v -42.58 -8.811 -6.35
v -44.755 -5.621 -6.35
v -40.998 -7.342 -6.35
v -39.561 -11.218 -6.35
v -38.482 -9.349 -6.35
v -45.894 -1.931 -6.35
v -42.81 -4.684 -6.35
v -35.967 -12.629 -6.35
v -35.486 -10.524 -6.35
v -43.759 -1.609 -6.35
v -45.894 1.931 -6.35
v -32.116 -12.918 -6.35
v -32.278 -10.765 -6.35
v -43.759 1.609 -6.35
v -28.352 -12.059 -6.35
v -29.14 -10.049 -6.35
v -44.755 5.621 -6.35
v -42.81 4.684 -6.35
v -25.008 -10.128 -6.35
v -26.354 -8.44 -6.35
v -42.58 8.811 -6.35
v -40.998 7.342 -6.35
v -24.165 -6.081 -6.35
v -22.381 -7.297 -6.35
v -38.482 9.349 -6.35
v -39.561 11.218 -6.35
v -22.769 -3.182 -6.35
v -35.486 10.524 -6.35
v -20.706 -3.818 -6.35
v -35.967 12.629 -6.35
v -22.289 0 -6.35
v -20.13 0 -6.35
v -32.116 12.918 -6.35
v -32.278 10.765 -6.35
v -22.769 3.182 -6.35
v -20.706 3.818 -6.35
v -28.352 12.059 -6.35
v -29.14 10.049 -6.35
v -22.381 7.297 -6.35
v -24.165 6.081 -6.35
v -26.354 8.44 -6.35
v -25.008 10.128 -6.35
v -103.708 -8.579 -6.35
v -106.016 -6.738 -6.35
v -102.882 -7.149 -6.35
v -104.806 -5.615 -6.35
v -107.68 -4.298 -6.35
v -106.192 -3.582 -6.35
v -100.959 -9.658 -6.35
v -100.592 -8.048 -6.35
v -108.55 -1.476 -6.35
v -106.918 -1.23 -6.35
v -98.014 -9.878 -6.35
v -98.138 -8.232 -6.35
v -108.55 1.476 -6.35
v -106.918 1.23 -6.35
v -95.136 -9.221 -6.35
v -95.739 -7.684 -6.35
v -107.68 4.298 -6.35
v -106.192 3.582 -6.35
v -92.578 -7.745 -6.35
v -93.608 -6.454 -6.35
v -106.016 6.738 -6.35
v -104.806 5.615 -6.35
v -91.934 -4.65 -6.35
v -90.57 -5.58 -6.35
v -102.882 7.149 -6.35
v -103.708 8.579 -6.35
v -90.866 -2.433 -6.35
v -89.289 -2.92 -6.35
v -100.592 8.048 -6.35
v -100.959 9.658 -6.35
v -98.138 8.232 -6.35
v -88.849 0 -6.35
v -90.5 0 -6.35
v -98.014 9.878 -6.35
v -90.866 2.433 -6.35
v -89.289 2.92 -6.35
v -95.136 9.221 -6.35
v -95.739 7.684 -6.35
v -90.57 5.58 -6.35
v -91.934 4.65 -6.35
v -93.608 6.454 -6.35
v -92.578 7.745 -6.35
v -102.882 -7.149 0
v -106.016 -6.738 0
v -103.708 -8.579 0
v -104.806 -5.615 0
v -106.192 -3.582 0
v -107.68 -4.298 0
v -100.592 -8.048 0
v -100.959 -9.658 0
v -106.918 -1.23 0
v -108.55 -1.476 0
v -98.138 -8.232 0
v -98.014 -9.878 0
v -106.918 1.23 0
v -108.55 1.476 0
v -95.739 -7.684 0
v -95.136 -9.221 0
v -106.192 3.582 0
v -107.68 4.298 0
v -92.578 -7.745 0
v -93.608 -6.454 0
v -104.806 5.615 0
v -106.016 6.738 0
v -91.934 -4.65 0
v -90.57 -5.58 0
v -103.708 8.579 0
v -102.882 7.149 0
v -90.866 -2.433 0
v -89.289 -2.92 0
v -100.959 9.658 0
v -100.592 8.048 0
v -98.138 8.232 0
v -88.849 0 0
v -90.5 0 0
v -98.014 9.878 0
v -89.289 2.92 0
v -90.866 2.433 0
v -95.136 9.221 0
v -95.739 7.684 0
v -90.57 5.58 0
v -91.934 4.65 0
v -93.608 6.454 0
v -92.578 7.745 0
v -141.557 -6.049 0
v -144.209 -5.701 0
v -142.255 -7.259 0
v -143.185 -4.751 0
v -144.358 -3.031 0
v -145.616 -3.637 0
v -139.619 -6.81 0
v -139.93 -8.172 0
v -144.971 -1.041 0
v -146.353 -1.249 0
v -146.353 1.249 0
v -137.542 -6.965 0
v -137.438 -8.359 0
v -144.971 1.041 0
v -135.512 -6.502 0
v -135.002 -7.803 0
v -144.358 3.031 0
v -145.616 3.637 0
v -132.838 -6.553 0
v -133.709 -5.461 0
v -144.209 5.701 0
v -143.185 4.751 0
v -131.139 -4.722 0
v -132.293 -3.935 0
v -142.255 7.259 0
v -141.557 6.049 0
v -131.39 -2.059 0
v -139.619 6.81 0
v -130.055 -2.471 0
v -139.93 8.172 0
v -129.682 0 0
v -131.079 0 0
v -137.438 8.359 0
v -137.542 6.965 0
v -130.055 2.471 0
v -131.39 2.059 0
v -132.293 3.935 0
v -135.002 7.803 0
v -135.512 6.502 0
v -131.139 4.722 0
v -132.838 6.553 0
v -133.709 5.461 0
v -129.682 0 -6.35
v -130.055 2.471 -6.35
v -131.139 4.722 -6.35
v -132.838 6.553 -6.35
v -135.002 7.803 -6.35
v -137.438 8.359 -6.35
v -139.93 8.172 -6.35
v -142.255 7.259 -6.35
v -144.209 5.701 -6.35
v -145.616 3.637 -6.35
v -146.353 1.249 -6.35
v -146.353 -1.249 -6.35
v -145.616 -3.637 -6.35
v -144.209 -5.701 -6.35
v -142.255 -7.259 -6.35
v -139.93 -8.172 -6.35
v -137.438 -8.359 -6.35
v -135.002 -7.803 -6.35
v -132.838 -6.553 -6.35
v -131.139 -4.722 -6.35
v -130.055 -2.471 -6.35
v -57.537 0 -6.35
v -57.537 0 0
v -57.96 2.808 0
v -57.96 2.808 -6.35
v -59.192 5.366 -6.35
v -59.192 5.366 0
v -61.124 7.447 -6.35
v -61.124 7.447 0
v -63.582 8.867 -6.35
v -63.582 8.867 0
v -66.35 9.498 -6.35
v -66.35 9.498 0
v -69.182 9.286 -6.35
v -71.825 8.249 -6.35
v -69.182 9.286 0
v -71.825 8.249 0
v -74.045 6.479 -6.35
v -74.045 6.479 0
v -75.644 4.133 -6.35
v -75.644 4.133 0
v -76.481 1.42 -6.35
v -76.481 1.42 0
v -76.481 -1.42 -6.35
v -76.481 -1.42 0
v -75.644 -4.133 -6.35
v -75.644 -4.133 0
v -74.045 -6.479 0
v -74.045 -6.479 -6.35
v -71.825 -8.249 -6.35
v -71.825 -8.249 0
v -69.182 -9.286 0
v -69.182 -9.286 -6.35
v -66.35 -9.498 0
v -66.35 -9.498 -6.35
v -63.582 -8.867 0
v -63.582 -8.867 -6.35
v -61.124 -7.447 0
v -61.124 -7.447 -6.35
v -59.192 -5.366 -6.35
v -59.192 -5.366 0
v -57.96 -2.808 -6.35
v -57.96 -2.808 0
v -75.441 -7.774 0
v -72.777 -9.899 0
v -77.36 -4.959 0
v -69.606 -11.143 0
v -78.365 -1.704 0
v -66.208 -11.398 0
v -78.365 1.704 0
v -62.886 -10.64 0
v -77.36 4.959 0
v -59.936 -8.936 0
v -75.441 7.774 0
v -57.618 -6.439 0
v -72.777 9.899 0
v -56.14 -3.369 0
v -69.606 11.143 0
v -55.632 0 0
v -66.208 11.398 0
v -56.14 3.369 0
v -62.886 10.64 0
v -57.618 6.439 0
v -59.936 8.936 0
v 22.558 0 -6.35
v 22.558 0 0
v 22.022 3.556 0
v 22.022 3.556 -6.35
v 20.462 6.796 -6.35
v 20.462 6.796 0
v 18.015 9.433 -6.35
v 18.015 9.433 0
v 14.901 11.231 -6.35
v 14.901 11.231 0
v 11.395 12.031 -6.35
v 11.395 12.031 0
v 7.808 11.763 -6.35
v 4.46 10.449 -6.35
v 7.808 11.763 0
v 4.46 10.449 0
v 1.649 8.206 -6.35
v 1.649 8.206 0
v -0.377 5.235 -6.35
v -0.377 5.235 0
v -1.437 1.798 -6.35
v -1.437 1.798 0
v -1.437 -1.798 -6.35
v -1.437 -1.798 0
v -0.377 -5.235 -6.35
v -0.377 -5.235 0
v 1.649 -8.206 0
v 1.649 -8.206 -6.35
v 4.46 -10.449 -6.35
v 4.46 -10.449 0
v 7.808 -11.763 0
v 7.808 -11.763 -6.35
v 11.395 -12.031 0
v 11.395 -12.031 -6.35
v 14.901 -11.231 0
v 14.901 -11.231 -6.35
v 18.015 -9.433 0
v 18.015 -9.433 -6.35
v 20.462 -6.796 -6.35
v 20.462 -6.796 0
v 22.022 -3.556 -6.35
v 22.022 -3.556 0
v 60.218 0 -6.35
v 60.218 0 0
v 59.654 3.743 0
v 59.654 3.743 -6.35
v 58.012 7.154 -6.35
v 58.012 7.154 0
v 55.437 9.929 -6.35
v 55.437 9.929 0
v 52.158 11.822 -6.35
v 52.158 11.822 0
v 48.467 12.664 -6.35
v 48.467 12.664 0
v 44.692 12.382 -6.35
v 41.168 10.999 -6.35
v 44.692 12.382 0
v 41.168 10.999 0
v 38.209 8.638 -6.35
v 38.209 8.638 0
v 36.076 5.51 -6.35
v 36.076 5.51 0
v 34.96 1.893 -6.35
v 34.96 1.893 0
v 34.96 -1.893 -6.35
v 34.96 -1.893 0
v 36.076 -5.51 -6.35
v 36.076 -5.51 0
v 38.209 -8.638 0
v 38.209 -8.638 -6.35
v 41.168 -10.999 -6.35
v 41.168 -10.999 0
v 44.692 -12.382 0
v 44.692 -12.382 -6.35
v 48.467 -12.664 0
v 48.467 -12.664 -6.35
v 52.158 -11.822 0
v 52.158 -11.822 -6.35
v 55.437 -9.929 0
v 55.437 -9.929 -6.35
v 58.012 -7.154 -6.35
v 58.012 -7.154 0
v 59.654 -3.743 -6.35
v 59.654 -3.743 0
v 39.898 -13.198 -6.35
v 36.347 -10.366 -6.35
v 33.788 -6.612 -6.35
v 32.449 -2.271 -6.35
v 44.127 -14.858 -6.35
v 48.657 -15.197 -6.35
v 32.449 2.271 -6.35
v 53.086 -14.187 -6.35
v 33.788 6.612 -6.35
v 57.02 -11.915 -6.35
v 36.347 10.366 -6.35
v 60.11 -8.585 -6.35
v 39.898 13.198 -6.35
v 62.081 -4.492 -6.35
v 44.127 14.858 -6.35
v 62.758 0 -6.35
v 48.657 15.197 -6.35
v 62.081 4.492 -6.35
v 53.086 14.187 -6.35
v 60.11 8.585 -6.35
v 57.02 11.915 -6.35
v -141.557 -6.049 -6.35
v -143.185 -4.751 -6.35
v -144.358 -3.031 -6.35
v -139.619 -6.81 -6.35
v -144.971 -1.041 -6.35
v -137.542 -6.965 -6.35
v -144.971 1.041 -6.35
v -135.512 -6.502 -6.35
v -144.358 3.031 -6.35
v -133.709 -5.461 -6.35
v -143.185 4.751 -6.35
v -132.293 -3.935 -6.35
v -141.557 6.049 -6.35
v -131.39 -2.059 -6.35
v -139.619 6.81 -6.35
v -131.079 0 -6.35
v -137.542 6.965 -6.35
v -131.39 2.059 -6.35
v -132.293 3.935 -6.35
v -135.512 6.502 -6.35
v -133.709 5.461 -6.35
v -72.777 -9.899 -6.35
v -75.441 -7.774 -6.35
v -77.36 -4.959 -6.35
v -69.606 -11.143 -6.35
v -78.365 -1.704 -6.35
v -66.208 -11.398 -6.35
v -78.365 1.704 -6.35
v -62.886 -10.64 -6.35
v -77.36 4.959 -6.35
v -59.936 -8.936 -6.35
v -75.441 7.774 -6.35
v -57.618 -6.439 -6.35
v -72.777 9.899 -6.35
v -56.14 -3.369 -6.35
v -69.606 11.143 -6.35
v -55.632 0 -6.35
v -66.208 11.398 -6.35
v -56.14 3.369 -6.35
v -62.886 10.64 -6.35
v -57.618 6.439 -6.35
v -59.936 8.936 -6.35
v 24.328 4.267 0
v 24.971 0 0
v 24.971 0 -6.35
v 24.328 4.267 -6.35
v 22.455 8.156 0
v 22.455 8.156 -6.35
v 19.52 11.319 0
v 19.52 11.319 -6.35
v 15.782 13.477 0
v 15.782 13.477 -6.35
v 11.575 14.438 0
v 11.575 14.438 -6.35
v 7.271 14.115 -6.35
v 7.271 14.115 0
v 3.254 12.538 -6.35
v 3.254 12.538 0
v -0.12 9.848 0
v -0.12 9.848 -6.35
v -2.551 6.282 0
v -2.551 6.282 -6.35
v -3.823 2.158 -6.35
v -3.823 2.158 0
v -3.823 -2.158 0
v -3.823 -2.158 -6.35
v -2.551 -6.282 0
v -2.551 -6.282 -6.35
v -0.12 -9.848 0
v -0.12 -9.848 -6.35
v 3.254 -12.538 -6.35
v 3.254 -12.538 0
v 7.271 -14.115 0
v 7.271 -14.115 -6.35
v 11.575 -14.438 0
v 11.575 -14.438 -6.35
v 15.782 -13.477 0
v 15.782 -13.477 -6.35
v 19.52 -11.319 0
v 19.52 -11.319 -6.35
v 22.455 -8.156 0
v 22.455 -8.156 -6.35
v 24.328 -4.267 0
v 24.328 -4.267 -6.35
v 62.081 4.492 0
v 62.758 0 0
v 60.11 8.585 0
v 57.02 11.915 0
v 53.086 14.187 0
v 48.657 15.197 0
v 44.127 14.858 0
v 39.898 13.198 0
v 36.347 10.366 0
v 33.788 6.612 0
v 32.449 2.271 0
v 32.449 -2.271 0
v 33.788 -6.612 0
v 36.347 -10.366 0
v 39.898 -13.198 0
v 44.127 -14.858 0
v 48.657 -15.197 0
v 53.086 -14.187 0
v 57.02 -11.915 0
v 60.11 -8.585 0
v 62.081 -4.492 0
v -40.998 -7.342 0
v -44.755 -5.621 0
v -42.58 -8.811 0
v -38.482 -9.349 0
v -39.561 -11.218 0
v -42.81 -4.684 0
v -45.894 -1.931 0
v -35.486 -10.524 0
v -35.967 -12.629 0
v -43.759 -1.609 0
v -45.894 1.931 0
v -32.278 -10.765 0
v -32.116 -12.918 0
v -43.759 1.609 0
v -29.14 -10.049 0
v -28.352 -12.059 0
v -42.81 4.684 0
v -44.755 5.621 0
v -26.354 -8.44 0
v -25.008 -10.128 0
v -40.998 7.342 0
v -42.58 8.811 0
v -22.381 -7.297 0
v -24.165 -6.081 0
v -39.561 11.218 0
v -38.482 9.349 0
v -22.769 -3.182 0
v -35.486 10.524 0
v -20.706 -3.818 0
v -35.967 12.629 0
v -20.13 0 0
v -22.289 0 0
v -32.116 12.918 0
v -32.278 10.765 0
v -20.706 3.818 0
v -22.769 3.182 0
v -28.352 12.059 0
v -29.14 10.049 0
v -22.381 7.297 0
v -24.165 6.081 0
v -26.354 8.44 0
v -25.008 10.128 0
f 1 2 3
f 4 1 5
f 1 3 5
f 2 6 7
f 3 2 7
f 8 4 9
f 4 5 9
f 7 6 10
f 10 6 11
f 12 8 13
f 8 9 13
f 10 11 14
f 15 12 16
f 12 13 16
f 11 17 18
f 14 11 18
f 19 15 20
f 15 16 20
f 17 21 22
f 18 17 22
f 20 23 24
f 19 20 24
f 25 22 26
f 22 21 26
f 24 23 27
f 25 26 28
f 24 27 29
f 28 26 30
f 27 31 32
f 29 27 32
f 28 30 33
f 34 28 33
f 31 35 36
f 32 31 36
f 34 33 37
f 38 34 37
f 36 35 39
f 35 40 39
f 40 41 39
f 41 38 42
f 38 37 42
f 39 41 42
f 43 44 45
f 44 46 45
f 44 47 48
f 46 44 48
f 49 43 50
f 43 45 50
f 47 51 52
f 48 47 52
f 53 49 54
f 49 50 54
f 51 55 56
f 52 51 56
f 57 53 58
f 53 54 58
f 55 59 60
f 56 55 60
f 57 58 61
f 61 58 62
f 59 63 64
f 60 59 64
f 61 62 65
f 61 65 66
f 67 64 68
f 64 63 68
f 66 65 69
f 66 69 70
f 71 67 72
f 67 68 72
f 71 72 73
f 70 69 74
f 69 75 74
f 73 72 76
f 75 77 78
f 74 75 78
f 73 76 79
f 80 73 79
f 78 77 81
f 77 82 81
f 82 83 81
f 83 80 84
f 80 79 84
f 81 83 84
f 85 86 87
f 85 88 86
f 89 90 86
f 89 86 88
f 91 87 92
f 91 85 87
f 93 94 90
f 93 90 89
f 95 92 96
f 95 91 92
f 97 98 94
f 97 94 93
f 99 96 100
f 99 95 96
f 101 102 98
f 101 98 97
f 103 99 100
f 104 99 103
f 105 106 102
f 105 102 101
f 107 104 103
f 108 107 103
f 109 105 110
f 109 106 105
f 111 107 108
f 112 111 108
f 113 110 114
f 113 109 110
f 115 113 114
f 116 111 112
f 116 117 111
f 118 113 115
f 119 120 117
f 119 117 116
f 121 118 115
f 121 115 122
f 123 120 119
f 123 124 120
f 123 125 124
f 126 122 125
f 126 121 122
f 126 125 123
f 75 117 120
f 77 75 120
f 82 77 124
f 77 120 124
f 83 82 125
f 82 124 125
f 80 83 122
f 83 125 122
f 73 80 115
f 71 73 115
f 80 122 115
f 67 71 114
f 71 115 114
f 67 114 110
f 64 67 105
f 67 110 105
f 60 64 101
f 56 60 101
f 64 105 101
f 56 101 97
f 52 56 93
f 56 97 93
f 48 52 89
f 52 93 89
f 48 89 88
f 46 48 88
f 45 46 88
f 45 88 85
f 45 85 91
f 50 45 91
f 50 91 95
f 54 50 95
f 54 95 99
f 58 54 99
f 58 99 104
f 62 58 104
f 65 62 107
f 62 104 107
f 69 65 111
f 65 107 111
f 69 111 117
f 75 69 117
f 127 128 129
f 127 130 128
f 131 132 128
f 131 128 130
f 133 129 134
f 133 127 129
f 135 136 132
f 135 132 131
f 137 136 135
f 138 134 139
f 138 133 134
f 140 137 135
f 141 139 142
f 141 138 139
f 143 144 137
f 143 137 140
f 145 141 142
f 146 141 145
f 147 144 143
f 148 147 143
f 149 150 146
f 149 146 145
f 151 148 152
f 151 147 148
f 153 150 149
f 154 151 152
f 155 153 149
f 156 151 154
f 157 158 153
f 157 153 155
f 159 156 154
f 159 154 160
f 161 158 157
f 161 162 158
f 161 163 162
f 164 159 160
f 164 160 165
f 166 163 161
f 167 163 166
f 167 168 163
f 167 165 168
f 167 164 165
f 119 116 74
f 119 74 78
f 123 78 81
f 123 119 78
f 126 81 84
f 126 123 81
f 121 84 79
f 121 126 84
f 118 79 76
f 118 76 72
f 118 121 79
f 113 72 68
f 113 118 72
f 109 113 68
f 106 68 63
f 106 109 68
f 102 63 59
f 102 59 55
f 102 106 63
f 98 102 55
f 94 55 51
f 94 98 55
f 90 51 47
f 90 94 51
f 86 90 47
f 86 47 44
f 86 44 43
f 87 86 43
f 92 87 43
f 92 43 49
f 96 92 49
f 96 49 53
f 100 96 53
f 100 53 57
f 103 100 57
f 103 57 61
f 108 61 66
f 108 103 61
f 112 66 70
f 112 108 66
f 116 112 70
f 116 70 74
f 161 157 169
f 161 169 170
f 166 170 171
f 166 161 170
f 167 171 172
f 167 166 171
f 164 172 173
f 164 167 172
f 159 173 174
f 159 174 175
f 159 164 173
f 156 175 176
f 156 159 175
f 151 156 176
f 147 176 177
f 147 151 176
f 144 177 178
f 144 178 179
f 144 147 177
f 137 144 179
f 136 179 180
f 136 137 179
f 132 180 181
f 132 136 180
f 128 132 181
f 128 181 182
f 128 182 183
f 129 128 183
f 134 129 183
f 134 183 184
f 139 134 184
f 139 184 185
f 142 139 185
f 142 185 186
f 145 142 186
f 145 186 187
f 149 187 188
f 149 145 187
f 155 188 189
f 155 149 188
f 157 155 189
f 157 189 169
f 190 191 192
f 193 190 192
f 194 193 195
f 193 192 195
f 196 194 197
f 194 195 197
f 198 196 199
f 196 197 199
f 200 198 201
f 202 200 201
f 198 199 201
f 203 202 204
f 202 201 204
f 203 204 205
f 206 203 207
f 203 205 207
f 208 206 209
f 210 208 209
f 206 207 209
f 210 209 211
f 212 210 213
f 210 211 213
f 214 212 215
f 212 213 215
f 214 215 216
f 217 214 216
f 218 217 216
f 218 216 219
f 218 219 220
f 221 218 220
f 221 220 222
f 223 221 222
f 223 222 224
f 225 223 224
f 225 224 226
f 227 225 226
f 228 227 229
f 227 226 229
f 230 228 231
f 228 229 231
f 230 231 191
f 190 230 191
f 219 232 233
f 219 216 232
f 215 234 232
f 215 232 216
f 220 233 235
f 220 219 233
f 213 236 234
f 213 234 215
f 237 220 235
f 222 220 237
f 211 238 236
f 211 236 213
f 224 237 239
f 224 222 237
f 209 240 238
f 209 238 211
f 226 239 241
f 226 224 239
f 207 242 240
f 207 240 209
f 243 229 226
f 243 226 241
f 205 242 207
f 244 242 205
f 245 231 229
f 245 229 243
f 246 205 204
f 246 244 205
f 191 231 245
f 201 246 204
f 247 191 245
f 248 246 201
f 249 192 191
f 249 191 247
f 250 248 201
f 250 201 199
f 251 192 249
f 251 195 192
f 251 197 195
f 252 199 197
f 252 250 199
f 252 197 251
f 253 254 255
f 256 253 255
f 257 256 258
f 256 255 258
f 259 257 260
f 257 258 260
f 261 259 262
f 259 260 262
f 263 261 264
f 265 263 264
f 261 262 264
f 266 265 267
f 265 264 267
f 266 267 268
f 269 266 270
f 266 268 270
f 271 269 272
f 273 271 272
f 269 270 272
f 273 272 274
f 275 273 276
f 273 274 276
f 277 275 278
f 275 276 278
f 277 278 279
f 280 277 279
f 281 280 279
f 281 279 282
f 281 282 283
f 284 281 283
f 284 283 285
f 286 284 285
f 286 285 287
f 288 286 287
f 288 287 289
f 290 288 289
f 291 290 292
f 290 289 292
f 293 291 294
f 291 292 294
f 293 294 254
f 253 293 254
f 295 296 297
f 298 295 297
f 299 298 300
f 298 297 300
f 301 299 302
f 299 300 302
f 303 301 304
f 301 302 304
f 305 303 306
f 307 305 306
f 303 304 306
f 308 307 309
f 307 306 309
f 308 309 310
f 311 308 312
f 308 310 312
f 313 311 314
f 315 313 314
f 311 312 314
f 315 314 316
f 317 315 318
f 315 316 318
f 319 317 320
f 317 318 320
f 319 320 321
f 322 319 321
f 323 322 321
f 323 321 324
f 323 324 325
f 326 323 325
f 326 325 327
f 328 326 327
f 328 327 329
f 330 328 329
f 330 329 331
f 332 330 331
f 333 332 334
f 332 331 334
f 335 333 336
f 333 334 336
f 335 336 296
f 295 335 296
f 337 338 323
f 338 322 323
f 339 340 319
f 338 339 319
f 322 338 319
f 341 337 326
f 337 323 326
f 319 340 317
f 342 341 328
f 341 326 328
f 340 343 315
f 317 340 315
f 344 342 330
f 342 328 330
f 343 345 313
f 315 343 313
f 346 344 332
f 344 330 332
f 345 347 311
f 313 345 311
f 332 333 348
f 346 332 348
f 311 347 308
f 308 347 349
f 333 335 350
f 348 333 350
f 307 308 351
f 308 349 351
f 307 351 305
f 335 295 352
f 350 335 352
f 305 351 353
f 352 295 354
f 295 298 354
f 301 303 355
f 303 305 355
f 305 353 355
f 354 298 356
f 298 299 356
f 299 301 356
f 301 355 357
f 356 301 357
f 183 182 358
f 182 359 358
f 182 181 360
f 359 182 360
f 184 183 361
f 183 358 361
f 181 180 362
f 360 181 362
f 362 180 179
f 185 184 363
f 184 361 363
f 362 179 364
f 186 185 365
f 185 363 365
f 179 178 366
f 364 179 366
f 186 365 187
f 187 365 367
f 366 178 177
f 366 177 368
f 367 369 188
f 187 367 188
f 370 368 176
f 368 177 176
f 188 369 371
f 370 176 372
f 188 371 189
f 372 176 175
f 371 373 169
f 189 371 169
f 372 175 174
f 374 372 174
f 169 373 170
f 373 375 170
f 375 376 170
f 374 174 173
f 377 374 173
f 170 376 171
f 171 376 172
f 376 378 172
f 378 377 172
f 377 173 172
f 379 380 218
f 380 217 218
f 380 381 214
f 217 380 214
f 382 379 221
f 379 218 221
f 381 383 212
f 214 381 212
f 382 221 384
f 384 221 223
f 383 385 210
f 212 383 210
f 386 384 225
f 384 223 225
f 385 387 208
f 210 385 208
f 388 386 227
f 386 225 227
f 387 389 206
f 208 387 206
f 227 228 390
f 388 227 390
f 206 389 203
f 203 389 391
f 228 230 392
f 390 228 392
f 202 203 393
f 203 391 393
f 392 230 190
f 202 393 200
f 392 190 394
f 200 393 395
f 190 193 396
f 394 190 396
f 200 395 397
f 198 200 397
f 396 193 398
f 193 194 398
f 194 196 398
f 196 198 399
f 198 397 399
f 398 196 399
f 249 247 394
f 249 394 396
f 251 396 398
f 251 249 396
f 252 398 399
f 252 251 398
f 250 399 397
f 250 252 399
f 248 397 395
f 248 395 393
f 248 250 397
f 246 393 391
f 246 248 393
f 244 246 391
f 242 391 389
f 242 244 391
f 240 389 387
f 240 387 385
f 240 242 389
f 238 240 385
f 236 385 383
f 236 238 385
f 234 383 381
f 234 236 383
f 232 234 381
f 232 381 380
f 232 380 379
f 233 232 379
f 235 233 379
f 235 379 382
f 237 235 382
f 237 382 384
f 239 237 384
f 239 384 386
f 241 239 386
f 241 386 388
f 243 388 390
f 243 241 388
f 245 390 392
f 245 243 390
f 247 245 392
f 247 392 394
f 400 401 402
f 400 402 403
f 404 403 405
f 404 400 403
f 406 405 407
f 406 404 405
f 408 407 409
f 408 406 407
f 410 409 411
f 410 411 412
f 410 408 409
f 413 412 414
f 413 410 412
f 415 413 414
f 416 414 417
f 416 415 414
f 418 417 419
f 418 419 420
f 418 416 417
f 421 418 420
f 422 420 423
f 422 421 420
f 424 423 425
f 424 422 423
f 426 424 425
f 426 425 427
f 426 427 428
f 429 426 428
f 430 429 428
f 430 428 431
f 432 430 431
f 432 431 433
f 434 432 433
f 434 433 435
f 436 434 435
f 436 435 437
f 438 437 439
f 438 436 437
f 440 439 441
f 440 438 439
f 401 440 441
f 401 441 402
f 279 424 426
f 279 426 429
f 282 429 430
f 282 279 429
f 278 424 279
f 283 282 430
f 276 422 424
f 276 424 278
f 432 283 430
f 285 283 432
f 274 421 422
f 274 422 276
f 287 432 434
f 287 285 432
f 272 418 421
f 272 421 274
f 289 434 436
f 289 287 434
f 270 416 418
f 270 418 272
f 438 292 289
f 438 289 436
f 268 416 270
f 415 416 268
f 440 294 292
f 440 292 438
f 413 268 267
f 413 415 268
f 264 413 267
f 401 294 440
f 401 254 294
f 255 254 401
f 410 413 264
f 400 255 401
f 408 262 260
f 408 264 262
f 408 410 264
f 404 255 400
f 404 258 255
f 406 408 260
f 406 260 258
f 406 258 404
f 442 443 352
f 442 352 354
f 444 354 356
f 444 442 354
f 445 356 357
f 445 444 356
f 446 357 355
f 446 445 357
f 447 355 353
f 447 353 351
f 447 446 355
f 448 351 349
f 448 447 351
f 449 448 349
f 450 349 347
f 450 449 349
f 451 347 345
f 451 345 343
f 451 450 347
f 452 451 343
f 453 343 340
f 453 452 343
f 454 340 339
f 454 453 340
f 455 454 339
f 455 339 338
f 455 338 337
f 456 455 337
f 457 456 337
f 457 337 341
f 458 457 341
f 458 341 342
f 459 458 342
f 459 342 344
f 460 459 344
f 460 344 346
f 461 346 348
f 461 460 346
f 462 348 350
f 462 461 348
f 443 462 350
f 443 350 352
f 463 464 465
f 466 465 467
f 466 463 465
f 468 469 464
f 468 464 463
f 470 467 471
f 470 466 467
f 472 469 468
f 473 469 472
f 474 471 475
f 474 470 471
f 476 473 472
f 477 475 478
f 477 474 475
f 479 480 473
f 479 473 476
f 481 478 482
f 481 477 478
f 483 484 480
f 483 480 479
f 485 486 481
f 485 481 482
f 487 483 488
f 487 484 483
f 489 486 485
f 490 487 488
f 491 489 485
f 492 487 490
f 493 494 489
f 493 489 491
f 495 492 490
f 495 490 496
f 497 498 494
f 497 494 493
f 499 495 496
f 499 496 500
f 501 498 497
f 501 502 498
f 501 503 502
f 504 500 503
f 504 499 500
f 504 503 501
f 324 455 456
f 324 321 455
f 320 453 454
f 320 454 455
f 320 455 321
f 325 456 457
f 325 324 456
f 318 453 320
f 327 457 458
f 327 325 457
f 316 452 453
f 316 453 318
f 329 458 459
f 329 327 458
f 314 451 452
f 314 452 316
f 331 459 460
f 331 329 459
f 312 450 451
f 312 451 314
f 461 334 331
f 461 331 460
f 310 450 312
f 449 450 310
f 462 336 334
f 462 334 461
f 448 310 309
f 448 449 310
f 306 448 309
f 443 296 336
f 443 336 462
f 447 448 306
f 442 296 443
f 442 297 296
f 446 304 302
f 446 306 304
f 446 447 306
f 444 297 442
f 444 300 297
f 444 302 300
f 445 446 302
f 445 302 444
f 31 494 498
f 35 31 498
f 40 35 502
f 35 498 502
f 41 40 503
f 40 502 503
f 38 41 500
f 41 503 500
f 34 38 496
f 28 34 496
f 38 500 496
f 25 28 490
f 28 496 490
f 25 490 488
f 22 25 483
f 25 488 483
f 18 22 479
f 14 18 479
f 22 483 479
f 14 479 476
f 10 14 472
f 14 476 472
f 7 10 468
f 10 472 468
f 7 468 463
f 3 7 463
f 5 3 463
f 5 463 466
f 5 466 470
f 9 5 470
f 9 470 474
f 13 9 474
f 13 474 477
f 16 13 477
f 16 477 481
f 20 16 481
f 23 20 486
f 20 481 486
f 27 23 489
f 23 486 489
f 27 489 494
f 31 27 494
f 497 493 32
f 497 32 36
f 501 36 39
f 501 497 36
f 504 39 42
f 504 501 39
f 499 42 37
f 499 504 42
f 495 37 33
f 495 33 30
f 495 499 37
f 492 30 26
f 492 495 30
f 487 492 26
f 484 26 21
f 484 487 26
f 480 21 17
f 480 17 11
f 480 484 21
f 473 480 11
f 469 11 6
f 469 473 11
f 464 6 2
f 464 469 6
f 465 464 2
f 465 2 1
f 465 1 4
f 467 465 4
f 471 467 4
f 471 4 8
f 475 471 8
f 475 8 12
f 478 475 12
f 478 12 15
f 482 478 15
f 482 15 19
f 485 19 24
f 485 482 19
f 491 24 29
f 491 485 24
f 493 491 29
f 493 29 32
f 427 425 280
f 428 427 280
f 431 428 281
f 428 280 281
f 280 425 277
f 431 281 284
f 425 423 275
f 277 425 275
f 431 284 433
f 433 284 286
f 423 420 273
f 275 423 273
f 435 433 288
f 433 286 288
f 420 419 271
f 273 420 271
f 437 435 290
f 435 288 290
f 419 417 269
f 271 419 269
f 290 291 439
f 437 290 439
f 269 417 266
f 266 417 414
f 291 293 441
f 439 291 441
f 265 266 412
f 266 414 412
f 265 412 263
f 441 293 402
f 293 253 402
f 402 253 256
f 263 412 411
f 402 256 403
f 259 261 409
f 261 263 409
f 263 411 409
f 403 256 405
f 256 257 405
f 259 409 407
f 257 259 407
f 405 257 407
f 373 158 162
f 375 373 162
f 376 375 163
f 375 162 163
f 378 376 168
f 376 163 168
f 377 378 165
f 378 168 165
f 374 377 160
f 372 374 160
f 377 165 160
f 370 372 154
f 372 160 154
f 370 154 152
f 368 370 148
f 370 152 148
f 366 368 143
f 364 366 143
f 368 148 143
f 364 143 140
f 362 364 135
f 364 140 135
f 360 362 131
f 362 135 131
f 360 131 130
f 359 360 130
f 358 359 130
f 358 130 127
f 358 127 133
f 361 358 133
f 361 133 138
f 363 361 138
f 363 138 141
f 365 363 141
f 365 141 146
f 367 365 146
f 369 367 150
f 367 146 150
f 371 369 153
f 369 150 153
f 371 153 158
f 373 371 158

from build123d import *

# Parameters (mm, degrees)
F0_R     = 8.382
F0_R_2   = 6.985
F0_R_3   = 9.906
F0_R_4   = 8.255
F0_R_5   = 11.43
F0_R_6   = 9.525
F0_R_7   = 12.954
F0_R_8   = 10.795
F0_R_9   = 14.478
F0_R_10  = 12.065
F0_R_11  = 15.24
F0_R_12  = 12.7
F1_DEPTH = 6.35


with BuildPart() as f1:
    # F0 (on Top) → F1 (new body)
    with BuildSketch(Plane.XY):
        with Locations((-138.064337, 0)):
            Circle(F0_R)
        with Locations((-138.064337, 0)):
            Circle(F0_R_2, mode=Mode.SUBTRACT)
        with Locations((-98.754741, 0)):
            Circle(F0_R_3)
        with Locations((-98.754741, 0)):
            Circle(F0_R_4, mode=Mode.SUBTRACT)
        with Locations((-67.062244, 0)):
            Circle(F0_R_5)
        with Locations((-67.062244, 0)):
            Circle(F0_R_6, mode=Mode.SUBTRACT)
        with Locations((-33.084221, 0)):
            Circle(F0_R_7)
        with Locations((-33.084221, 0)):
            Circle(F0_R_8, mode=Mode.SUBTRACT)
        with Locations((10.49297, 0)):
            Circle(F0_R_9)
        with Locations((10.49297, 0)):
            Circle(F0_R_10, mode=Mode.SUBTRACT)
        with Locations((47.518346, 0)):
            Circle(F0_R_11)
        with Locations((47.518346, 0)):
            Circle(F0_R_12, mode=Mode.SUBTRACT)
    extrude(amount=-F1_DEPTH)


solid = f1.part
